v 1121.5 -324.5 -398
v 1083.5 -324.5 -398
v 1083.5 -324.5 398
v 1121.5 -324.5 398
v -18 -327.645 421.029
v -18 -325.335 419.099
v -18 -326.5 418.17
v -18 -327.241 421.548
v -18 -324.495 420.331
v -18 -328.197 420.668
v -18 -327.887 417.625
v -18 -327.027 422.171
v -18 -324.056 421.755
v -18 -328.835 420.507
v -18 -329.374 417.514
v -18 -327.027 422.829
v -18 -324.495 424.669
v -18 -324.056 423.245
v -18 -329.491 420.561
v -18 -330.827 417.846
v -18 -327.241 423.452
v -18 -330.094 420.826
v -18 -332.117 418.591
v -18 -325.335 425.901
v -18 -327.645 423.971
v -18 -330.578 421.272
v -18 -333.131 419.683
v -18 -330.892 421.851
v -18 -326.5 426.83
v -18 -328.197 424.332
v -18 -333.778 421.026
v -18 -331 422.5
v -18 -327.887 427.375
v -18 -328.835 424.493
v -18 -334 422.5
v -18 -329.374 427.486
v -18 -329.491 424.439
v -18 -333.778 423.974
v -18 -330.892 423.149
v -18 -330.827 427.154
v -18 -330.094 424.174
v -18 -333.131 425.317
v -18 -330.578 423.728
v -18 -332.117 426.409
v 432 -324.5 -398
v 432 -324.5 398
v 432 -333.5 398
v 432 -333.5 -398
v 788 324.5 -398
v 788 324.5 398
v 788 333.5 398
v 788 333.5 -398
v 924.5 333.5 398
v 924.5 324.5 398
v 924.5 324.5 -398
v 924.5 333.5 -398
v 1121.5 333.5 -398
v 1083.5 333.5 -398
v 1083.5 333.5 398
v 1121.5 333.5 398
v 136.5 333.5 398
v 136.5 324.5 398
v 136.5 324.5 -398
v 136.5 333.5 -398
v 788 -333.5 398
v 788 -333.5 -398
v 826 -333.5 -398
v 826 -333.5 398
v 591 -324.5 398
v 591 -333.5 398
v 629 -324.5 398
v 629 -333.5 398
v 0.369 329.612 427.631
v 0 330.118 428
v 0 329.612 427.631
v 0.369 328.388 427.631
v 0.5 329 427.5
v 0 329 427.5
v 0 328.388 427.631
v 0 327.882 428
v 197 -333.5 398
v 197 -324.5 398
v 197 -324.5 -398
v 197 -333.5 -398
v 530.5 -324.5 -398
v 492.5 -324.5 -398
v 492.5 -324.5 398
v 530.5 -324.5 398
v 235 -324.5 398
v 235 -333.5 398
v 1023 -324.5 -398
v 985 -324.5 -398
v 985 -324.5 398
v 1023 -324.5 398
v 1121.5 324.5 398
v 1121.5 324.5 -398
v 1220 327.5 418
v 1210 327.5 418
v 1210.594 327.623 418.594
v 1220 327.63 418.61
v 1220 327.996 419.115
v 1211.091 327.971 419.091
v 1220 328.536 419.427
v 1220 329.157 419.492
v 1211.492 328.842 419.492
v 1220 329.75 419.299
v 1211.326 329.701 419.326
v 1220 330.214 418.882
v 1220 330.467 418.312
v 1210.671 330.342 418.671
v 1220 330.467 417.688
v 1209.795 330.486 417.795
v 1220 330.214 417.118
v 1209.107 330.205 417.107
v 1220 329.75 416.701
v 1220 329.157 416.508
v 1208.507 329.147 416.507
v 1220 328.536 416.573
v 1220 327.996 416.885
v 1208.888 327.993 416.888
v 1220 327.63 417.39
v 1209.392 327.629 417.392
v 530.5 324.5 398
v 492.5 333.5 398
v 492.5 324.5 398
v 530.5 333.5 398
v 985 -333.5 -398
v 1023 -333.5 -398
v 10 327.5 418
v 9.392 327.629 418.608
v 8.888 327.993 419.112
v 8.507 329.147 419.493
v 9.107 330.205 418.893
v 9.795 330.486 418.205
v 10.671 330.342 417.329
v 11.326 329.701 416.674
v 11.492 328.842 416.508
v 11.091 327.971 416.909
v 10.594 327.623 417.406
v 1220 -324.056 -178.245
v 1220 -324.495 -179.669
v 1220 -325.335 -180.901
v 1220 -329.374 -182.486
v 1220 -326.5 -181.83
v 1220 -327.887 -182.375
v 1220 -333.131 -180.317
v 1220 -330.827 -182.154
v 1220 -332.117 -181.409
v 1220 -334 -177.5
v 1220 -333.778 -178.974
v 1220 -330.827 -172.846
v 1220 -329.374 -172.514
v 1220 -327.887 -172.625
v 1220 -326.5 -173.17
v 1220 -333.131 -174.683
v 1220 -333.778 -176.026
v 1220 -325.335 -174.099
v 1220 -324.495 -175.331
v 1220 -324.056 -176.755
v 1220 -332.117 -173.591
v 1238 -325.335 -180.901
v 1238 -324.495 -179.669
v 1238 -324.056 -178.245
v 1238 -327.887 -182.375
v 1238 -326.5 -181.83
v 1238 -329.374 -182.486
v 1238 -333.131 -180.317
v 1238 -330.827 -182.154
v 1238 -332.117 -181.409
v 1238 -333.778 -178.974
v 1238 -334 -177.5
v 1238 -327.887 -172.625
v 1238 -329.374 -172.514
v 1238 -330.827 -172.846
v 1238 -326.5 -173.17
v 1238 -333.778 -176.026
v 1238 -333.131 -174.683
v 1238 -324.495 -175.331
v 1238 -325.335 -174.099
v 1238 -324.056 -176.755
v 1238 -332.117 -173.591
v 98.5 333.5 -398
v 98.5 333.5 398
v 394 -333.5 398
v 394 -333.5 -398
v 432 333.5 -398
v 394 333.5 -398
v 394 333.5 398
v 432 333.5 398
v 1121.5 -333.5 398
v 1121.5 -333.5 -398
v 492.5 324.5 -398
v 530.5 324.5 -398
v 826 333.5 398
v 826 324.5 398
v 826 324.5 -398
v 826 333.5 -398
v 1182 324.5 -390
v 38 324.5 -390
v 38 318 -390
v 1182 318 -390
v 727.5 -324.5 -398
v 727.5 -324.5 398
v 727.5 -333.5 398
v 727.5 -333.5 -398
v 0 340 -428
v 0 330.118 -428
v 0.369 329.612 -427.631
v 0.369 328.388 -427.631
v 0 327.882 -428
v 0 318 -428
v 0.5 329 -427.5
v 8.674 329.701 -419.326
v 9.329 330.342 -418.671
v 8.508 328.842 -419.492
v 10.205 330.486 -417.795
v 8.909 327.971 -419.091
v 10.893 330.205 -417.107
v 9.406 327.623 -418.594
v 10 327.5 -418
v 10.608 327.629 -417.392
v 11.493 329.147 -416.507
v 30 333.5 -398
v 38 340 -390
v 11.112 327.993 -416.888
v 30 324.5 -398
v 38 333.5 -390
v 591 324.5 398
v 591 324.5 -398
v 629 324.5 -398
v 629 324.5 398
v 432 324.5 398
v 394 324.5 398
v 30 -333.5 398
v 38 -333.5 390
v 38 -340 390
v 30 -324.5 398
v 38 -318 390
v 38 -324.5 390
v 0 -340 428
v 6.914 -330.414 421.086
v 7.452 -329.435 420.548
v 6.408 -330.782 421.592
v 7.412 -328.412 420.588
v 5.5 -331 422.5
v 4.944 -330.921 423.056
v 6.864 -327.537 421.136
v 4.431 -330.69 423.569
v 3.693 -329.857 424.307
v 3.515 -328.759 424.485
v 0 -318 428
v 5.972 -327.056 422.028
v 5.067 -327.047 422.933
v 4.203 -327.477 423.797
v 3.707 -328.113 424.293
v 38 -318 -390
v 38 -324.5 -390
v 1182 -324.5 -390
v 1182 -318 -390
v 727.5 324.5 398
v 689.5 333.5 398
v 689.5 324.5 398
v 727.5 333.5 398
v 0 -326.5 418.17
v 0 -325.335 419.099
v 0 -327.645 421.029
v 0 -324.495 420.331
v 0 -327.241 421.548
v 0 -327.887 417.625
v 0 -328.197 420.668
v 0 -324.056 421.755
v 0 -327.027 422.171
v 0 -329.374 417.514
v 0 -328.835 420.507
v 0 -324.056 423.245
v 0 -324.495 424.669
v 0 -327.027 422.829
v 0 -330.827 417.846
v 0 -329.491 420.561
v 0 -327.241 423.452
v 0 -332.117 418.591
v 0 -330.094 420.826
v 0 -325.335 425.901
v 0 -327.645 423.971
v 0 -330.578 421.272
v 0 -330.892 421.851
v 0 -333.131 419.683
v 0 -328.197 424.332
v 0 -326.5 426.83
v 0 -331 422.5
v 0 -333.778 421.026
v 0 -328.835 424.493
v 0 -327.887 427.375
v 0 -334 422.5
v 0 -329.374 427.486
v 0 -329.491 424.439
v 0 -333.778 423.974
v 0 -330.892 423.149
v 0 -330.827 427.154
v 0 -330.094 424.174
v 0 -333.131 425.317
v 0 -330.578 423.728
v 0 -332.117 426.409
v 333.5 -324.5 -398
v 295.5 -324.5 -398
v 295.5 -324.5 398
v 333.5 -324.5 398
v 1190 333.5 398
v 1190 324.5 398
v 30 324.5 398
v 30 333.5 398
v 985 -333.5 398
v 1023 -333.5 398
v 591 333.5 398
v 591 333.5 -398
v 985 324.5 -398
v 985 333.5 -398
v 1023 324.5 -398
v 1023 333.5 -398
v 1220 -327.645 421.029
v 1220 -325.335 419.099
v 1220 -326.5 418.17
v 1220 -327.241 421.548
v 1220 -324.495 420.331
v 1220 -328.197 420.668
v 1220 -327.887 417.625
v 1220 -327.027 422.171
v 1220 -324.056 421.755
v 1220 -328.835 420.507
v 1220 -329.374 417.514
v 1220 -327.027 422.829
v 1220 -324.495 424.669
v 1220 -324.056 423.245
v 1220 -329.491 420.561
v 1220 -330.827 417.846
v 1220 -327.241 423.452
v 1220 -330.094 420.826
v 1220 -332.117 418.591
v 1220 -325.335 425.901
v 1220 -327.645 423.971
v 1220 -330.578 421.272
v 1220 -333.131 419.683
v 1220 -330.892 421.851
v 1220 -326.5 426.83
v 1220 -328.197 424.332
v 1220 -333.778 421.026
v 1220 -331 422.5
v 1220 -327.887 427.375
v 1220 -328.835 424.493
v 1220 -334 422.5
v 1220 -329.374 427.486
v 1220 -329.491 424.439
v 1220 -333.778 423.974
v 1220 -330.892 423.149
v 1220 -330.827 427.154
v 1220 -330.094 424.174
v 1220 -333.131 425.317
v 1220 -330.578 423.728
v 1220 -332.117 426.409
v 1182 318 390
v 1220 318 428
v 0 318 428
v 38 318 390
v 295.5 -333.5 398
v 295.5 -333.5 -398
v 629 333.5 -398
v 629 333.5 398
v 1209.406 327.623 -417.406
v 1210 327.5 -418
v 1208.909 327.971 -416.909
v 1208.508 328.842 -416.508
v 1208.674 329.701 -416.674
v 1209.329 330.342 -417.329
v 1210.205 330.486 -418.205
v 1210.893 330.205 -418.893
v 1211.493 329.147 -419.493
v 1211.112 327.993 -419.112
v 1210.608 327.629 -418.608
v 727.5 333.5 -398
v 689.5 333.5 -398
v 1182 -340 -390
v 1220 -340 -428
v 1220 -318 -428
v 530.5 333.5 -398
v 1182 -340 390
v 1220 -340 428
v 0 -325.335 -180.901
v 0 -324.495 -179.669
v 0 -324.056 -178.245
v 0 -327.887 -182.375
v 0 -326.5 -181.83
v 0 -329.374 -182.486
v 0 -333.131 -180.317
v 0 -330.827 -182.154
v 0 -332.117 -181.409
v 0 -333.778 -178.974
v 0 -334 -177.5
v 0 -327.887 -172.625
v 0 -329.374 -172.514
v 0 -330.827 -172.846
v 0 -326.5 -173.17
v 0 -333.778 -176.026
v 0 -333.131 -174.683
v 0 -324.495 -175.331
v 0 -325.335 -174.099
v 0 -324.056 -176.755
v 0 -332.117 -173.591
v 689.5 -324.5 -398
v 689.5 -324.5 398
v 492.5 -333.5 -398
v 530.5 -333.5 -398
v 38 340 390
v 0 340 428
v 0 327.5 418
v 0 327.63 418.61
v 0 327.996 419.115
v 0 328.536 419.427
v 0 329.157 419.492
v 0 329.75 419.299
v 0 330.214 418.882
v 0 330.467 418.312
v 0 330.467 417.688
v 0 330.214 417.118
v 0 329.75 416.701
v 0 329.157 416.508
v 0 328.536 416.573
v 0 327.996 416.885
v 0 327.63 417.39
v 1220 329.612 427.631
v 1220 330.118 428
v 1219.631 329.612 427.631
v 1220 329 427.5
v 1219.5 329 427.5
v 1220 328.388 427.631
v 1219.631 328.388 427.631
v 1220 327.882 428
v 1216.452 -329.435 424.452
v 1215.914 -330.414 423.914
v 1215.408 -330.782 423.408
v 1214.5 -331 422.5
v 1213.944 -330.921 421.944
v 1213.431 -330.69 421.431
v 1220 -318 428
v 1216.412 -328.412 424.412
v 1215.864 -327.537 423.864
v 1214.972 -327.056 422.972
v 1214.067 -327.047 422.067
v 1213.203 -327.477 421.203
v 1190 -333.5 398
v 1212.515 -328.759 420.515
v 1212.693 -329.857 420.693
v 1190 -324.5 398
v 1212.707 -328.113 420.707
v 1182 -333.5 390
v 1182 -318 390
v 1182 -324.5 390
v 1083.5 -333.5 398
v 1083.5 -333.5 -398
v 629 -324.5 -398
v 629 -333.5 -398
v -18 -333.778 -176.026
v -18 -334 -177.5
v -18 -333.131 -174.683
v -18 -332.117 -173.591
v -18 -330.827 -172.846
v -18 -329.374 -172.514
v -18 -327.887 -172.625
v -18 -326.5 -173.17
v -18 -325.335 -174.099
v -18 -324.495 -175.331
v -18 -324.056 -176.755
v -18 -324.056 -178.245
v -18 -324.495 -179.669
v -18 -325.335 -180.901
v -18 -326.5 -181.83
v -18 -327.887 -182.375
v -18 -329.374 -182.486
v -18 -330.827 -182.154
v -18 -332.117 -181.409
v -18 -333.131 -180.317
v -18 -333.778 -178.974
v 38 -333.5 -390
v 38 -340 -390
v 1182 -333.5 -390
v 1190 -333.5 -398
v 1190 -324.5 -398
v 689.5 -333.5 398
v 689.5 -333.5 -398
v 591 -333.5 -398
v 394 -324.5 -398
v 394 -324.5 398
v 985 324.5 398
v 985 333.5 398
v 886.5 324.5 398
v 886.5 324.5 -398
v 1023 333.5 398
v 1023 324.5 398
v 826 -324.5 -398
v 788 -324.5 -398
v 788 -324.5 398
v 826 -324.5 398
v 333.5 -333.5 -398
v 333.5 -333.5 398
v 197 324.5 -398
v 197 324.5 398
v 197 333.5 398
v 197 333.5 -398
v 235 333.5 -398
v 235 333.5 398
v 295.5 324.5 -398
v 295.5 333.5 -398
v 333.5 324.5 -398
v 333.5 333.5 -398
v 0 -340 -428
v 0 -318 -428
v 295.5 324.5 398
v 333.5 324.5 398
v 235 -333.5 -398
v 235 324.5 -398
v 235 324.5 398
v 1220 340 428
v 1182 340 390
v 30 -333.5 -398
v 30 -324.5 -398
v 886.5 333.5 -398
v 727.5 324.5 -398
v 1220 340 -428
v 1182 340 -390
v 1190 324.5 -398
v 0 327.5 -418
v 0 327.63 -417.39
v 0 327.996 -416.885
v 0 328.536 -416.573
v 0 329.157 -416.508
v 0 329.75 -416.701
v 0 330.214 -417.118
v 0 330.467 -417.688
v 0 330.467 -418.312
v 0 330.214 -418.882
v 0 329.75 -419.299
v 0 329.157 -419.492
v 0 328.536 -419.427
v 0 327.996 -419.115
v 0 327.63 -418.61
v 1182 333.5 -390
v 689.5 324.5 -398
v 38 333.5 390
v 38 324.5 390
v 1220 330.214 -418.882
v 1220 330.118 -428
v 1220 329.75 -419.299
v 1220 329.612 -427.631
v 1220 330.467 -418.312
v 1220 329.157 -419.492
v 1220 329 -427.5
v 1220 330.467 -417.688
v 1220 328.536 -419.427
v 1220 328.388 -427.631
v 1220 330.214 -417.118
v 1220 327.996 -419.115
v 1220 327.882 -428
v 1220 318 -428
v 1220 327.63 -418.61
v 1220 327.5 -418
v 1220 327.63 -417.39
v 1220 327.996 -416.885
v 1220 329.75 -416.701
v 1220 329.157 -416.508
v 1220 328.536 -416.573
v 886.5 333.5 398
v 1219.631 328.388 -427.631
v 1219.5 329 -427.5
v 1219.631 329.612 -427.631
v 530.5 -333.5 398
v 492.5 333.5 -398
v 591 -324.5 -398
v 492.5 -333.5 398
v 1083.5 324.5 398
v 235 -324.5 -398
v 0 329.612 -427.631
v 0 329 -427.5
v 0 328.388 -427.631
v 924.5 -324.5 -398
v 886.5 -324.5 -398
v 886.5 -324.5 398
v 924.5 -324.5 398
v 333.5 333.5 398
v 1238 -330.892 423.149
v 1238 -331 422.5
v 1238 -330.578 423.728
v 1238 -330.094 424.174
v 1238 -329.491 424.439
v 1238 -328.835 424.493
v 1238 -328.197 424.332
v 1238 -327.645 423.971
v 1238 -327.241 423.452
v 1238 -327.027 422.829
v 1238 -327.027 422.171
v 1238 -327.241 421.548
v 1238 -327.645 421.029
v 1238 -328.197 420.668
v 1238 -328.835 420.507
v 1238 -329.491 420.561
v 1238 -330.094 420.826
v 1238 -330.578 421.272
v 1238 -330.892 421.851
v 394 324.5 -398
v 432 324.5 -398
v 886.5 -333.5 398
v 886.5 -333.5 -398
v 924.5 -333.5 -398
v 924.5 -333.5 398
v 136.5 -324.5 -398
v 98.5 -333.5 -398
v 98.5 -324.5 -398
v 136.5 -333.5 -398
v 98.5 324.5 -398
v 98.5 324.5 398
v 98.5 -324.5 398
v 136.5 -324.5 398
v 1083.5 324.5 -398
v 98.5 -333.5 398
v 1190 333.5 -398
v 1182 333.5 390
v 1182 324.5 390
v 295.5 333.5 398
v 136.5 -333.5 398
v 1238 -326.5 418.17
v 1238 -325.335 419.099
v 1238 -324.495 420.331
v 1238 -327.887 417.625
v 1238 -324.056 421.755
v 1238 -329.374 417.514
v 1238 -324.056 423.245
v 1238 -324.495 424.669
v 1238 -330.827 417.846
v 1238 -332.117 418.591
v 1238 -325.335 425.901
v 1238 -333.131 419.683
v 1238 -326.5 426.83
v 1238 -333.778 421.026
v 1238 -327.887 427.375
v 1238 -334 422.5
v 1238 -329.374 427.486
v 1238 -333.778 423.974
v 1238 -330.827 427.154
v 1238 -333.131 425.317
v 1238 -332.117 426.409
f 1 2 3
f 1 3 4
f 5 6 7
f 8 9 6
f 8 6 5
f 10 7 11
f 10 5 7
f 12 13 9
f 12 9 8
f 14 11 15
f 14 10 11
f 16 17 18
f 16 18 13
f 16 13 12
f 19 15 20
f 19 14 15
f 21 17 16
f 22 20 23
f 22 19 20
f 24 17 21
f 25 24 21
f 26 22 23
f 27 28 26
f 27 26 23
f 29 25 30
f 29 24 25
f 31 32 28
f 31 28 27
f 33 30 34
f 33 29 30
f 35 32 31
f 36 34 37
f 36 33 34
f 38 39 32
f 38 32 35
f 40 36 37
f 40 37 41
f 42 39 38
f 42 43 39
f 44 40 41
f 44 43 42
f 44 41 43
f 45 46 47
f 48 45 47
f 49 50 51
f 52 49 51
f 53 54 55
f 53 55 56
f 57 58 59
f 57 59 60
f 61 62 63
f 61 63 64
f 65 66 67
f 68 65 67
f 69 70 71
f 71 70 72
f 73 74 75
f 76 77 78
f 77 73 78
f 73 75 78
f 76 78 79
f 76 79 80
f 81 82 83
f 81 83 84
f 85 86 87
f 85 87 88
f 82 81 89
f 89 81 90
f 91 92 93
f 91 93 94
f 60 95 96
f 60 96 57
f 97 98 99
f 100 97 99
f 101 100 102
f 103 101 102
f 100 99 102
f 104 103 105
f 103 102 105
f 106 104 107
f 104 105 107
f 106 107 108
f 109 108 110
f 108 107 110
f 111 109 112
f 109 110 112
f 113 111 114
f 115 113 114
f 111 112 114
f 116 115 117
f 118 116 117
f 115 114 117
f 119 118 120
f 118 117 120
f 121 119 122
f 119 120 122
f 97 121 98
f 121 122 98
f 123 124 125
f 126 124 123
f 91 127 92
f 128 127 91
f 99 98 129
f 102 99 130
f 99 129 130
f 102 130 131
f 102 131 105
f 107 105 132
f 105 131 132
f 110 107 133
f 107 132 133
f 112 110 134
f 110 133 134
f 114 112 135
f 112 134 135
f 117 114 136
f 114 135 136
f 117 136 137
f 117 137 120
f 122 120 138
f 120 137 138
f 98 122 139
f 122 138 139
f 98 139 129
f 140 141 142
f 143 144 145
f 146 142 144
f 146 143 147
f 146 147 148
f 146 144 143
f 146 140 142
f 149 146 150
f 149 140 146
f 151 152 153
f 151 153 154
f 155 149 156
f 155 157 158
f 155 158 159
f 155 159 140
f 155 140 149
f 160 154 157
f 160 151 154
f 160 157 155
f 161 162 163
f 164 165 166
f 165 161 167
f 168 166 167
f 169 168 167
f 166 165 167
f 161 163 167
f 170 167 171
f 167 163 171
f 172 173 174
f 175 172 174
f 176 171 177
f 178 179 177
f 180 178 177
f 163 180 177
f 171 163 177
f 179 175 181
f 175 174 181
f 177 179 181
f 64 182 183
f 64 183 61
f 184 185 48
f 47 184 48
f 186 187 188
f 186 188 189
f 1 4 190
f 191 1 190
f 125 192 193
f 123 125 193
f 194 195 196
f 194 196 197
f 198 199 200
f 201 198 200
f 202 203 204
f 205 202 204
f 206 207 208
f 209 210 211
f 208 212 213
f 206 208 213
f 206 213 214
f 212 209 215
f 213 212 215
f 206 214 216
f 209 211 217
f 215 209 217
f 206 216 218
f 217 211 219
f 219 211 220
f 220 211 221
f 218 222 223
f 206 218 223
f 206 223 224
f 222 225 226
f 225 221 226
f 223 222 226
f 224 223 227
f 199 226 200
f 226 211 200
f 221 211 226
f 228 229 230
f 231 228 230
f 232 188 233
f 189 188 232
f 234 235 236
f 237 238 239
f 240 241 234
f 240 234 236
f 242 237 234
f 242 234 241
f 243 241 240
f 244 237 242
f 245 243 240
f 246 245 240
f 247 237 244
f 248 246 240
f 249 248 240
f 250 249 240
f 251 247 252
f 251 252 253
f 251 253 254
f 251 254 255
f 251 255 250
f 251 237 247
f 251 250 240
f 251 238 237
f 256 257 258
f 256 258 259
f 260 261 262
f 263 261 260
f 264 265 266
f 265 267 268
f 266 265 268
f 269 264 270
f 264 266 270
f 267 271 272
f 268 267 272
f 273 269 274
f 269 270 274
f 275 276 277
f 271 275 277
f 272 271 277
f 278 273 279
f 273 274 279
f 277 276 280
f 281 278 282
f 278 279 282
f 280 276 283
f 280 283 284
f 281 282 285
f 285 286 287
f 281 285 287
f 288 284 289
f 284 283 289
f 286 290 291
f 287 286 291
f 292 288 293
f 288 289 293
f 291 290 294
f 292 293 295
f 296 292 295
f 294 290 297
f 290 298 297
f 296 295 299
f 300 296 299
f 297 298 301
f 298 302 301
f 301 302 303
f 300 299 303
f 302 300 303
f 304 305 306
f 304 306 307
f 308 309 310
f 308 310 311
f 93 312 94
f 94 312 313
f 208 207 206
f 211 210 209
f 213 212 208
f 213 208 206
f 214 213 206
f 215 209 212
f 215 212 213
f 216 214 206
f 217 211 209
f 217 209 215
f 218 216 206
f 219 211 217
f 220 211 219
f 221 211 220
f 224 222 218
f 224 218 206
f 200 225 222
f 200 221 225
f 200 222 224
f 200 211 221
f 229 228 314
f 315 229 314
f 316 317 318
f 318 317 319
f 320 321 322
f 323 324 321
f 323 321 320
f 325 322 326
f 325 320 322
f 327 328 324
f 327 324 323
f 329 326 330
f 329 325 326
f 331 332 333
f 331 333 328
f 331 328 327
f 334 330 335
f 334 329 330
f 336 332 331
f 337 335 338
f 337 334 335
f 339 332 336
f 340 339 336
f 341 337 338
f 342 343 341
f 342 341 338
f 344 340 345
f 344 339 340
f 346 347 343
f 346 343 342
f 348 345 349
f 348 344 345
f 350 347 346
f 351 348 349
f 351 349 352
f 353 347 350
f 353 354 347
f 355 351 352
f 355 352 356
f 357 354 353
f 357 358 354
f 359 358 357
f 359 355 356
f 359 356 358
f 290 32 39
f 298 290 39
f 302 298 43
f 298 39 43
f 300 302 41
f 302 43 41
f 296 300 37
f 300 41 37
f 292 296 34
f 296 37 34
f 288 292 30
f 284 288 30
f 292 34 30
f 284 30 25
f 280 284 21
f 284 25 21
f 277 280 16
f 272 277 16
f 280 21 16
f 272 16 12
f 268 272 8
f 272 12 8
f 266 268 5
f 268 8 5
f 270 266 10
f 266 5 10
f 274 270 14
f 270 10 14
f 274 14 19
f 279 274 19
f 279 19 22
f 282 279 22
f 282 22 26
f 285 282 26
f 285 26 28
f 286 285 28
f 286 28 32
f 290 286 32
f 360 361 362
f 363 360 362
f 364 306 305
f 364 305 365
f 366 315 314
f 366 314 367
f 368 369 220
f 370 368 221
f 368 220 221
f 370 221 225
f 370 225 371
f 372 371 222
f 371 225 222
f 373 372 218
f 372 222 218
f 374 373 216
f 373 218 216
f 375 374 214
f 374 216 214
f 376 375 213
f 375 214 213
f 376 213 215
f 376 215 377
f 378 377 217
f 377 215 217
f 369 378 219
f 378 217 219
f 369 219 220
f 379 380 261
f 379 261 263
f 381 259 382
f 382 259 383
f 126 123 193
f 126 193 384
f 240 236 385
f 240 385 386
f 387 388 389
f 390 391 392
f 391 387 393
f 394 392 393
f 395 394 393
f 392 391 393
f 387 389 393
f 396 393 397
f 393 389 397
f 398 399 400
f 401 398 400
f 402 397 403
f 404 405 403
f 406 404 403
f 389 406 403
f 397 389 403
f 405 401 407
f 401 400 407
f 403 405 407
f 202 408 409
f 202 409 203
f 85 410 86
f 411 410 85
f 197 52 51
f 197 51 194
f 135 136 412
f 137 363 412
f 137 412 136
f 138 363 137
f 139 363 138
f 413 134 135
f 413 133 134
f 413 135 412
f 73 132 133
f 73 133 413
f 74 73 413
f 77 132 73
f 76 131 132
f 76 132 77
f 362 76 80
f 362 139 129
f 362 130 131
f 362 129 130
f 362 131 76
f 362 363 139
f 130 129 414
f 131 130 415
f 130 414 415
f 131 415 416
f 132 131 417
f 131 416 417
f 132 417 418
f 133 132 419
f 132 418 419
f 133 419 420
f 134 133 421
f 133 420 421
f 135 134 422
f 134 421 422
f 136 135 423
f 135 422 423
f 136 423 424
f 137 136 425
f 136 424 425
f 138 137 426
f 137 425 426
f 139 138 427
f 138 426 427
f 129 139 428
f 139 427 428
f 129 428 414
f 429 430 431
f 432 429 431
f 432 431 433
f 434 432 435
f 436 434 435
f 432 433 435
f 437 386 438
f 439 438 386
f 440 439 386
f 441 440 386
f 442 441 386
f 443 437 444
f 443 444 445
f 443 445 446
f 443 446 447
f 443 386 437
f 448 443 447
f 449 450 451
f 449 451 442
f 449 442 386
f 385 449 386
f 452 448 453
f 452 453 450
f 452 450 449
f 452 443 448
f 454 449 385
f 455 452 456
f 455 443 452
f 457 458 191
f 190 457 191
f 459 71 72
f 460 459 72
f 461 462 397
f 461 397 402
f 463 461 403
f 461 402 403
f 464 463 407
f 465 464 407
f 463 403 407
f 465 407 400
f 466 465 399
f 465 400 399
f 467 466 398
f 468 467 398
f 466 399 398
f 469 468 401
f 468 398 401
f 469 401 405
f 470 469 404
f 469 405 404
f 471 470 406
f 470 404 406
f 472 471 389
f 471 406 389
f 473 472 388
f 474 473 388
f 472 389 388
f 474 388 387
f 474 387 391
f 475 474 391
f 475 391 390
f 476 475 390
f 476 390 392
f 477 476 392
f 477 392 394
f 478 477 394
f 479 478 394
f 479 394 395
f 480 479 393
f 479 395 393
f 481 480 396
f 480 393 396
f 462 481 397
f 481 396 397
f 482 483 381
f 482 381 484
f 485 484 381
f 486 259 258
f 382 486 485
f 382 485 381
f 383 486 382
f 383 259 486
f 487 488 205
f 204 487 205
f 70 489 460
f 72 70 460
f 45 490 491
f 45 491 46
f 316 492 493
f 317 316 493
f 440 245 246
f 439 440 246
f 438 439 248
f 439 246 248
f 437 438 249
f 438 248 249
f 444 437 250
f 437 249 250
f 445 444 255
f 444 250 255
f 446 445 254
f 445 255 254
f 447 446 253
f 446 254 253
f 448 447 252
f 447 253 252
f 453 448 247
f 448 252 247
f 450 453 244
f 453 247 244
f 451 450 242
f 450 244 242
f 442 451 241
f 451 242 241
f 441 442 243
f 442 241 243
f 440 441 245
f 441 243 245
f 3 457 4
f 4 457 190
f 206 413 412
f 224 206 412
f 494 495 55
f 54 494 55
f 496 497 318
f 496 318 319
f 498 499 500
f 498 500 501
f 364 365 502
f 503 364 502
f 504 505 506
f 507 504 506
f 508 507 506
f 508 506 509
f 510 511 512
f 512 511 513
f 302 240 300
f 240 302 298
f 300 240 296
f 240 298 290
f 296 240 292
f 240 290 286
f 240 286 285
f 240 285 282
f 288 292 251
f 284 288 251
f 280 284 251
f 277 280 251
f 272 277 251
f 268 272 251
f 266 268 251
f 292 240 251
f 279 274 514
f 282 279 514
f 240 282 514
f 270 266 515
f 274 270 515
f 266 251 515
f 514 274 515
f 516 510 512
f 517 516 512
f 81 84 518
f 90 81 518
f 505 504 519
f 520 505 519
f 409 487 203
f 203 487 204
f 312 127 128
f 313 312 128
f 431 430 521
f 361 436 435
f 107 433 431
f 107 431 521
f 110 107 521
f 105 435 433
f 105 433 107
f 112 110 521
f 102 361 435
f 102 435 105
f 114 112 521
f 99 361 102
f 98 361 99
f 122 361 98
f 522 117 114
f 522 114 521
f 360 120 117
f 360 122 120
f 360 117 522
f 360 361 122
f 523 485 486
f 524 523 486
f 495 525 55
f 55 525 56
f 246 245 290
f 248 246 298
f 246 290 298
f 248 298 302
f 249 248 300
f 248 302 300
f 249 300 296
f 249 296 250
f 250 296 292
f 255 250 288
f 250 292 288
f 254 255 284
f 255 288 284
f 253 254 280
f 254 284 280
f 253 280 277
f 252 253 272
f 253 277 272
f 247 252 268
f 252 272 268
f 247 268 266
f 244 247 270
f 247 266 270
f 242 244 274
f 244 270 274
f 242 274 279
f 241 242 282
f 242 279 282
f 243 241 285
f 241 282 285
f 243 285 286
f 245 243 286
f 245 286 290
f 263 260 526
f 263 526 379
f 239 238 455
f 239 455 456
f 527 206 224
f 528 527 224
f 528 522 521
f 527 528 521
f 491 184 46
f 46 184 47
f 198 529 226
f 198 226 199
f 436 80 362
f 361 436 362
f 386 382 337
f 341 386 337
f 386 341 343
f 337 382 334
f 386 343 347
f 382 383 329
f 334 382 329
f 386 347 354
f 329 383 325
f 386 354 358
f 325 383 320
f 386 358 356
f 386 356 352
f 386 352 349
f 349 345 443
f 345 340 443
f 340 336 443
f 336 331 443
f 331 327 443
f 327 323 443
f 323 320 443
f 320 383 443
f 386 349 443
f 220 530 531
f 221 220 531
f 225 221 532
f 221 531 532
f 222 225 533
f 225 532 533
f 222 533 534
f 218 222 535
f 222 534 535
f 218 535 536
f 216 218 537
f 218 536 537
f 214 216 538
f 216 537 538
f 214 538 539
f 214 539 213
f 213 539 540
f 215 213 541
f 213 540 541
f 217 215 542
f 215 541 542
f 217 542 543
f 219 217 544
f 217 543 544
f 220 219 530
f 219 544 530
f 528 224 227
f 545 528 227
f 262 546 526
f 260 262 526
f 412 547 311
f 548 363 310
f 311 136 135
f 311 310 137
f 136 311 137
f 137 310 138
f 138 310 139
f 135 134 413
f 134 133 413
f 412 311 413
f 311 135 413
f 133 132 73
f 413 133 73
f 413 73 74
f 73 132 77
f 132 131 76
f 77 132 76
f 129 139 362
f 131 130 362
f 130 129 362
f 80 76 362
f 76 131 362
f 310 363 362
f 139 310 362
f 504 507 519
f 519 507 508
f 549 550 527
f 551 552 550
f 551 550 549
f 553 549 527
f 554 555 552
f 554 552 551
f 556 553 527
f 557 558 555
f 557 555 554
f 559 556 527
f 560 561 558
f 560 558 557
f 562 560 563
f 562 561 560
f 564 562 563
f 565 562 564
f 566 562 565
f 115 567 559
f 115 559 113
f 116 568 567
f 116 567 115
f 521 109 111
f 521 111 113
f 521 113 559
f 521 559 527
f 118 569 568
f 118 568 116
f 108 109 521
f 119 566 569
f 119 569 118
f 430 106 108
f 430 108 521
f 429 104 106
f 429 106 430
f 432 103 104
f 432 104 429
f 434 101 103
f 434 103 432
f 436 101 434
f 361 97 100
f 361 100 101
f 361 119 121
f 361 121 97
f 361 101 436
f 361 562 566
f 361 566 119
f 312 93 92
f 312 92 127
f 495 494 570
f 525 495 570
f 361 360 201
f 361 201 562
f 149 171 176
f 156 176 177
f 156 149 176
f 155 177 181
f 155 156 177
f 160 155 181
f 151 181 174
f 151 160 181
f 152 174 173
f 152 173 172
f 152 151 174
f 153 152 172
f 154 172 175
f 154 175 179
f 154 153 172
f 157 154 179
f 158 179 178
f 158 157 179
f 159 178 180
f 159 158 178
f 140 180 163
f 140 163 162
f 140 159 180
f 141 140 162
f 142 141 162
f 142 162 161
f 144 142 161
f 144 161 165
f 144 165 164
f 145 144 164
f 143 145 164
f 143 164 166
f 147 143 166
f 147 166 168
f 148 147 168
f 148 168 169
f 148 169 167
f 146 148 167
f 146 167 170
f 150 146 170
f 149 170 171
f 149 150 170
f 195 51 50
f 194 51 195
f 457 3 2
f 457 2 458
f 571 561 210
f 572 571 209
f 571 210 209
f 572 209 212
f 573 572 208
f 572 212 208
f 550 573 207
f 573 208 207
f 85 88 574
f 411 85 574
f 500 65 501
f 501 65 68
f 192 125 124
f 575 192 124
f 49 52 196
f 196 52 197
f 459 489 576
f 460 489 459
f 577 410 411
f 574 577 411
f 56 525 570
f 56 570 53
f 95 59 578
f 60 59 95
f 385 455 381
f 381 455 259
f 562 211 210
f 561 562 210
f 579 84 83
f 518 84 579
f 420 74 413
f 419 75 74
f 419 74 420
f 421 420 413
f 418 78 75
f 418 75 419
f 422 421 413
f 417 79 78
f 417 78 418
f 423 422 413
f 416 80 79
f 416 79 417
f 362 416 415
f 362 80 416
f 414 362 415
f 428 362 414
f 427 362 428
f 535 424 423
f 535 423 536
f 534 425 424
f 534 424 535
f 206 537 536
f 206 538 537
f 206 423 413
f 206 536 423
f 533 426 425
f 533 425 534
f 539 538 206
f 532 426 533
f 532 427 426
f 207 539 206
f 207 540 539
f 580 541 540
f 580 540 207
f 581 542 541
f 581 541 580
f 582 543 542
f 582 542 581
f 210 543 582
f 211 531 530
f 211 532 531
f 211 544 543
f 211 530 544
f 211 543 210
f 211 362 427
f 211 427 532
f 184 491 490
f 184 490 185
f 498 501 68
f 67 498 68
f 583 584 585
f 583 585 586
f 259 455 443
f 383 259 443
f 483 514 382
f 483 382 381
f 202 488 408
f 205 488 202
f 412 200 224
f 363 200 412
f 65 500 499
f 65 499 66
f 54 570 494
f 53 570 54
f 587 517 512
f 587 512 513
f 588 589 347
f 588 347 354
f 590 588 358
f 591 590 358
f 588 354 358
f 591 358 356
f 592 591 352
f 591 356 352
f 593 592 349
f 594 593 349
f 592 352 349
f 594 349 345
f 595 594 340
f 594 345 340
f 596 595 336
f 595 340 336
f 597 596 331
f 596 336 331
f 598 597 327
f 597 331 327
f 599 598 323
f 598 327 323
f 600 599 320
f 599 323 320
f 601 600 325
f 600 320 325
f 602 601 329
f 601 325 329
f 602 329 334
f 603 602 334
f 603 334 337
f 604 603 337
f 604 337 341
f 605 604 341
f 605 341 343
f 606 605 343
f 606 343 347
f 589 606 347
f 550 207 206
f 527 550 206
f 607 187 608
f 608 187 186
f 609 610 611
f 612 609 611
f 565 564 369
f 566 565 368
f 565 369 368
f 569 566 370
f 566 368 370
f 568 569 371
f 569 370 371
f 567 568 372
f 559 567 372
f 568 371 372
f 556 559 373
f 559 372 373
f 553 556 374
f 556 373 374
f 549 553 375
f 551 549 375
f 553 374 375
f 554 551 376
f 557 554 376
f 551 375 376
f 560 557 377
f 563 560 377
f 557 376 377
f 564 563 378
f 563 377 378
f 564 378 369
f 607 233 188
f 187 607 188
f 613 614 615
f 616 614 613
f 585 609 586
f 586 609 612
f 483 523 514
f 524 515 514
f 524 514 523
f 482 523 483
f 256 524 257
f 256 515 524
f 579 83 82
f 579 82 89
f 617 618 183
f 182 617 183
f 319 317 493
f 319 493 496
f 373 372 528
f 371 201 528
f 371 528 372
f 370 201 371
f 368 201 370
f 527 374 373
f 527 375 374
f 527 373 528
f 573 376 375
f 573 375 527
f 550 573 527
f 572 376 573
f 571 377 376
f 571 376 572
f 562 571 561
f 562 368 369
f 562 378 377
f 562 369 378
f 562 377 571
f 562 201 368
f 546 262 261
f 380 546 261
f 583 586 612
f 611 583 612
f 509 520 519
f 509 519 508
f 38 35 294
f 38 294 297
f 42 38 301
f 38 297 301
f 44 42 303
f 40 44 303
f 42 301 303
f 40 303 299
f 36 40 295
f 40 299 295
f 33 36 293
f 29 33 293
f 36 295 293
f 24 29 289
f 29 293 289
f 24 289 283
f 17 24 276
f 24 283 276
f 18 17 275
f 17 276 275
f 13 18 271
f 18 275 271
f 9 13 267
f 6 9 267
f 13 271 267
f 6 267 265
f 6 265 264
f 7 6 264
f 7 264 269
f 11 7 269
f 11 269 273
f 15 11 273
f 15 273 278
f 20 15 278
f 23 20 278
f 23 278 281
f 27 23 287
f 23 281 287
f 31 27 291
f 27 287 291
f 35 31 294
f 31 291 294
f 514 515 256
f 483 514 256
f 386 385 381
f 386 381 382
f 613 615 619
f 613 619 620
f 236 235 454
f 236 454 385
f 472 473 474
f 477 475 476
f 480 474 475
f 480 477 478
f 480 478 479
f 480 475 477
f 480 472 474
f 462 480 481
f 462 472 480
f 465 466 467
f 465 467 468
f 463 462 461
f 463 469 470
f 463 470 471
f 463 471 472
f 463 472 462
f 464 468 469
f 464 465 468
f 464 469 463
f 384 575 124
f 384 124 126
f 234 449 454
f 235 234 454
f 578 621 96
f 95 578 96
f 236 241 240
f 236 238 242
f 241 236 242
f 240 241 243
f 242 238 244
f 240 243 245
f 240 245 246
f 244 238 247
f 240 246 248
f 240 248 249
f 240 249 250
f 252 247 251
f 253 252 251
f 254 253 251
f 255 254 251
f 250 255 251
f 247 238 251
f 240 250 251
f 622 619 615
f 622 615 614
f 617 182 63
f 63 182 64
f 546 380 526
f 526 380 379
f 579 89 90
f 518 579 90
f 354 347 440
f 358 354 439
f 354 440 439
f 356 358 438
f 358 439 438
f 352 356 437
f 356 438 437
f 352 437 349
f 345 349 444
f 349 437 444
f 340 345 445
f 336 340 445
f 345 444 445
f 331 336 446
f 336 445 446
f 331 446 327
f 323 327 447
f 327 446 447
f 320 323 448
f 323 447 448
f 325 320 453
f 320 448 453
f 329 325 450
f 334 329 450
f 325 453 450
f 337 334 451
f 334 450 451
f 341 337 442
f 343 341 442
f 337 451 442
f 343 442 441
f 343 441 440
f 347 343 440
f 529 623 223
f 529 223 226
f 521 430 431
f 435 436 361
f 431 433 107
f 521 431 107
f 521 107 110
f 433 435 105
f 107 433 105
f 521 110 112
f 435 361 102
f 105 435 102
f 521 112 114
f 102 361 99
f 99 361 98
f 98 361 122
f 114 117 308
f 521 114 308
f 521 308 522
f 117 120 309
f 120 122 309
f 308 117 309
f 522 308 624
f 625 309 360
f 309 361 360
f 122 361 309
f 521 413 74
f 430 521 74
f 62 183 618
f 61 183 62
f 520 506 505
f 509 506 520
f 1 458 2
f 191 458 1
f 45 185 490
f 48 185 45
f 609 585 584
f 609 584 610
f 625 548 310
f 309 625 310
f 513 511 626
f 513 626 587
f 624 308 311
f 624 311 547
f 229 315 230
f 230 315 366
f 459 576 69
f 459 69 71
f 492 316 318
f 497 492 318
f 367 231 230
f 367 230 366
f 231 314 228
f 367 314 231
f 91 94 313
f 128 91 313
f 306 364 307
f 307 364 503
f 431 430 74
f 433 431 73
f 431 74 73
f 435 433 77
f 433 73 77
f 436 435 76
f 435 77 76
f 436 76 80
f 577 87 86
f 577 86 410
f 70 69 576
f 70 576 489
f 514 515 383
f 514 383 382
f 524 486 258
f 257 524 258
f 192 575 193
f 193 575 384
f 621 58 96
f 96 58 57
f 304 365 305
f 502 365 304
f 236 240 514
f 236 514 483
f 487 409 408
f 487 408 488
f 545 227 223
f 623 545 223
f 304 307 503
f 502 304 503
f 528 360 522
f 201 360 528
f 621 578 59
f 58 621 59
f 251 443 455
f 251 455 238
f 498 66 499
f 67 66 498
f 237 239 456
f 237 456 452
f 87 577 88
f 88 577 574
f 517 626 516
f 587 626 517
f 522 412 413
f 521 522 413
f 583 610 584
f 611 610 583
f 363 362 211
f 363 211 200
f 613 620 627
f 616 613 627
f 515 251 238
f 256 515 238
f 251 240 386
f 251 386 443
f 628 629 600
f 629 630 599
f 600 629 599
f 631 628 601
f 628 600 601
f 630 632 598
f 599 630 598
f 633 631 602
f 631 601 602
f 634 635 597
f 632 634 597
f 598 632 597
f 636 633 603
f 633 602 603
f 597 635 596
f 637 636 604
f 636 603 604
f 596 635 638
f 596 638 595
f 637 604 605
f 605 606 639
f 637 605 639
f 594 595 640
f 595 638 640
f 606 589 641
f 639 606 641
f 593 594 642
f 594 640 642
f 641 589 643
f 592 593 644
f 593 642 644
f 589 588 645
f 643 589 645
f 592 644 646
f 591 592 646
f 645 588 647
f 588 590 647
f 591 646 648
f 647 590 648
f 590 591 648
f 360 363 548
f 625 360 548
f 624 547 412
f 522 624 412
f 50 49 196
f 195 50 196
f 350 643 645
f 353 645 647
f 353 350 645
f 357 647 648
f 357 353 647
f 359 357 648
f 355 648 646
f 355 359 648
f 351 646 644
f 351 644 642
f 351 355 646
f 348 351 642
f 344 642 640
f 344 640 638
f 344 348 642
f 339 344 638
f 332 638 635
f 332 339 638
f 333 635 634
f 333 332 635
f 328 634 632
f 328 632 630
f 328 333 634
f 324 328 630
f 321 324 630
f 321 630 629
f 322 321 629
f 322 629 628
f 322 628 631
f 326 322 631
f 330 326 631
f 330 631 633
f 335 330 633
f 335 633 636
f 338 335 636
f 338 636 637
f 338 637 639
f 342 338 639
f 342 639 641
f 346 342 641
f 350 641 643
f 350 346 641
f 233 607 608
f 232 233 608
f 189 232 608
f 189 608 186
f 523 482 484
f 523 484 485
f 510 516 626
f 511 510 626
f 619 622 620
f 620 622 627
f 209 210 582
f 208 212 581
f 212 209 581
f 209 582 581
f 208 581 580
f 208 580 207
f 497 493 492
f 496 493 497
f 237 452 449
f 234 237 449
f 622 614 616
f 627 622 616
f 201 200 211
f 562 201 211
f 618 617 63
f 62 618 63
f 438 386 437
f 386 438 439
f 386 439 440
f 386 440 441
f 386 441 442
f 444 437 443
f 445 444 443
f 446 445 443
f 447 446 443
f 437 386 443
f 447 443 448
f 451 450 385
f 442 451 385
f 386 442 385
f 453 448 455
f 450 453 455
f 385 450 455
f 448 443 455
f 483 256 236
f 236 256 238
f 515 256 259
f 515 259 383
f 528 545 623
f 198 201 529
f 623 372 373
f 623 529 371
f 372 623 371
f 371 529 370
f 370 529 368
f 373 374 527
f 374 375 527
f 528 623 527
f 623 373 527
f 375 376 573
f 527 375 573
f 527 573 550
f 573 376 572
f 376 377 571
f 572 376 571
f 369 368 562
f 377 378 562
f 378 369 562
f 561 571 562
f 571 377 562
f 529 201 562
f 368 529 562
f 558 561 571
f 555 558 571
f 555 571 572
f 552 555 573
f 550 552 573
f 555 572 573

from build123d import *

# Parameters (mm, degrees)
F1_DEPTH  = 1220
F3_DEPTH  = 350
F4_DEPTH  = 22
F5_W      = 38
F5_H      = 9
F6_DEPTH  = 796
F9_R      = 1.5
F10_DEPTH = 1220.001
F11_R     = 5
F12_DEPTH = 18
F16_R     = 2
F17_DEPTH = 1256


with BuildPart() as f1:
    # F0 (on Right) → F1 (new body)
    with BuildSketch(Plane.YZ):
        Polygon((340, 428), (318, 428), (318, 390), (324.5, 390), (324.5, 398), (333.5, 398), (333.5, 390), (340, 390), align=None)
    extrude(amount=F1_DEPTH)


with BuildPart() as f1b:
    # F0 (on Right) → F1, piece 2 (new body)
    with BuildSketch(Plane.YZ):
        Polygon((324.5, -390), (318, -390), (318, -428), (340, -428), (340, -390), (333.5, -390), (333.5, -398), (324.5, -398), align=None)
    extrude(amount=F1_DEPTH)


with BuildPart() as f3_tool:
    # F2 (on face) → F3 (new body)
    with BuildSketch(Plane.XZ.offset(-318)):
        Polygon((0, 428), (0, -428), (38, -390), (38, 390), align=None)
        Polygon((1220, 428), (1182, 390), (1182, -390), (1220, -428), align=None)
    extrude(amount=-F3_DEPTH)


with BuildPart() as f1_1:
    add(f1.part)

    # F3: cut by f3_tool
    add(f3_tool.part, mode=Mode.SUBTRACT)


with BuildPart() as f1b_1:
    add(f1b.part)

    # F3: cut by f3_tool
    add(f3_tool.part, mode=Mode.SUBTRACT)


with BuildPart() as f4:
    # F2 (on face) → F4 (new body)
    with BuildSketch(Plane.XZ.offset(-318)):
        Polygon((0, 428), (0, -428), (38, -390), (38, 390), align=None)
    extrude(amount=-F4_DEPTH)


with BuildPart() as f4b:
    # F2 (on face) → F4, piece 2 (new body)
    with BuildSketch(Plane.XZ.offset(-318)):
        Polygon((1220, 428), (1182, 390), (1182, -390), (1220, -428), align=None)
    extrude(amount=-F4_DEPTH)


with BuildPart() as f6:
    # F5 (on face) → F6 (new body, through all)
    with BuildSketch(Plane.XY.offset(-398)):
        with Locations((117.5, 329)):
            Rectangle(F5_W, F5_H)
    extrude(amount=F6_DEPTH)


with BuildPart() as f6b:
    # F5 (on face) → F6, piece 2 (new body, through all)
    with BuildSketch(Plane.XY.offset(-398)):
        with Locations((216, 329)):
            Rectangle(F5_W, F5_H)
    extrude(amount=F6_DEPTH)


with BuildPart() as f6c:
    # F5 (on face) → F6, piece 3 (new body, through all)
    with BuildSketch(Plane.XY.offset(-398)):
        with Locations((314.5, 329)):
            Rectangle(F5_W, F5_H)
    extrude(amount=F6_DEPTH)


with BuildPart() as f6d:
    # F5 (on face) → F6, piece 4 (new body, through all)
    with BuildSketch(Plane.XY.offset(-398)):
        with Locations((413, 329)):
            Rectangle(F5_W, F5_H)
    extrude(amount=F6_DEPTH)


with BuildPart() as f6e:
    # F5 (on face) → F6, piece 5 (new body, through all)
    with BuildSketch(Plane.XY.offset(-398)):
        with Locations((511.5, 329)):
            Rectangle(F5_W, F5_H)
    extrude(amount=F6_DEPTH)


with BuildPart() as f6f:
    # F5 (on face) → F6, piece 6 (new body, through all)
    with BuildSketch(Plane.XY.offset(-398)):
        with Locations((610, 329)):
            Rectangle(F5_W, F5_H)
    extrude(amount=F6_DEPTH)


with BuildPart() as f6g:
    # F5 (on face) → F6, piece 7 (new body, through all)
    with BuildSketch(Plane.XY.offset(-398)):
        with Locations((708.5, 329)):
            Rectangle(F5_W, F5_H)
    extrude(amount=F6_DEPTH)


with BuildPart() as f6h:
    # F5 (on face) → F6, piece 8 (new body, through all)
    with BuildSketch(Plane.XY.offset(-398)):
        with Locations((807, 329)):
            Rectangle(F5_W, F5_H)
    extrude(amount=F6_DEPTH)


with BuildPart() as f6i:
    # F5 (on face) → F6, piece 9 (new body, through all)
    with BuildSketch(Plane.XY.offset(-398)):
        with Locations((905.5, 329)):
            Rectangle(F5_W, F5_H)
    extrude(amount=F6_DEPTH)


with BuildPart() as f6j:
    # F5 (on face) → F6, piece 10 (new body, through all)
    with BuildSketch(Plane.XY.offset(-398)):
        with Locations((1004, 329)):
            Rectangle(F5_W, F5_H)
    extrude(amount=F6_DEPTH)


with BuildPart() as f6k:
    # F5 (on face) → F6, piece 11 (new body, through all)
    with BuildSketch(Plane.XY.offset(-398)):
        with Locations((1102.5, 329)):
            Rectangle(F5_W, F5_H)
    extrude(amount=F6_DEPTH)


with BuildPart() as f8_1:
    # F8: instance of F4
    add(f4.part.mirror(Plane.XZ))


with BuildPart() as f8_2:
    # F8: instance of F4b
    add(f4b.part.mirror(Plane.XZ))


with BuildPart() as f8_3:
    # F8: instance of F6g
    add(f6g.part.mirror(Plane.XZ))


with BuildPart() as f8_4:
    # F8: instance of F6
    add(f6.part.mirror(Plane.XZ))


with BuildPart() as f8_5:
    # F8: instance of F6b
    add(f6b.part.mirror(Plane.XZ))


with BuildPart() as f8_6:
    # F8: instance of F6c
    add(f6c.part.mirror(Plane.XZ))


with BuildPart() as f8_7:
    # F8: instance of F6d
    add(f6d.part.mirror(Plane.XZ))


with BuildPart() as f8_8:
    # F8: instance of F6e
    add(f6e.part.mirror(Plane.XZ))


with BuildPart() as f8_9:
    # F8: instance of F6f
    add(f6f.part.mirror(Plane.XZ))


with BuildPart() as f8_10:
    # F8: instance of F6h
    add(f6h.part.mirror(Plane.XZ))


with BuildPart() as f8_11:
    # F8: instance of F6i
    add(f6i.part.mirror(Plane.XZ))


with BuildPart() as f8_12:
    # F8: instance of F6j
    add(f6j.part.mirror(Plane.XZ))


with BuildPart() as f8_13:
    # F8: instance of F6k
    add(f6k.part.mirror(Plane.XZ))


with BuildPart() as f8_14:
    # F8: instance of F1
    add(f1_1.part.mirror(Plane.XZ))


with BuildPart() as f8_15:
    # F8: instance of F1b
    add(f1b_1.part.mirror(Plane.XZ))


with BuildPart() as f10_tool:
    # F9 (on face) → F10 (new body, through all)
    with BuildSketch(Plane(origin=(0, 0, 0), x_dir=(0, -1, 0), z_dir=(-1, 0, 0))):
        with Locations((-329, 429)):
            Circle(F9_R)
        with Locations((-329, 418)):
            Circle(F9_R)
        with Locations((-329, -418)):
            Circle(F9_R)
        with Locations((-329, -429)):
            Circle(F9_R)
    extrude(amount=-F10_DEPTH)


with BuildPart() as f1_2:
    add(f1_1.part)

    # F10: cut by f10_tool
    add(f10_tool.part, mode=Mode.SUBTRACT)


with BuildPart() as f1b_2:
    add(f1b_1.part)

    # F10: cut by f10_tool
    add(f10_tool.part, mode=Mode.SUBTRACT)


with BuildPart() as f4_1:
    add(f4.part)

    # F10: cut by f10_tool
    add(f10_tool.part, mode=Mode.SUBTRACT)


with BuildPart() as f4b_1:
    add(f4b.part)

    # F10: cut by f10_tool
    add(f10_tool.part, mode=Mode.SUBTRACT)


with BuildPart() as f12:
    # F11 (on face) → F12 (new body)
    with BuildSketch(Plane(origin=(0, 0, 0), x_dir=(0, -1, 0), z_dir=(-1, 0, 0))):
        with Locations((329, 422.5)):
            Circle(F11_R)
    extrude(amount=F12_DEPTH)


with BuildPart() as f12b:
    # F11 (on face) → F12, piece 2 (new body)
    with BuildSketch(Plane(origin=(0, 0, 0), x_dir=(0, -1, 0), z_dir=(-1, 0, 0))):
        with Locations((329, -177.5)):
            Circle(F11_R)
    extrude(amount=F12_DEPTH)


with BuildPart() as f15_1:
    # F15: instance of F12
    add(f12.part.mirror(Plane(origin=(610, -329, 0), x_dir=(0, -1, 0), z_dir=(-1, 0, 0))))


with BuildPart() as f15_2:
    # F15: instance of F12b
    add(f12b.part.mirror(Plane(origin=(610, -329, 0), x_dir=(0, -1, 0), z_dir=(-1, 0, 0))))


with BuildPart() as f17_tool:
    # F16 (on face) → F17 (new body, through all)
    with BuildSketch(Plane(origin=(-18, 0, 0), x_dir=(0, -1, 0), z_dir=(-1, 0, 0))):
        with Locations((329, 422.5)):
            Circle(F16_R)
    extrude(amount=-F17_DEPTH)


with BuildPart() as f8_1_1:
    add(f8_1.part)

    # F17: cut by f17_tool
    add(f17_tool.part, mode=Mode.SUBTRACT)


with BuildPart() as f8_2_1:
    add(f8_2.part)

    # F17: cut by f17_tool
    add(f17_tool.part, mode=Mode.SUBTRACT)


with BuildPart() as f8_14_1:
    add(f8_14.part)

    # F17: cut by f17_tool
    add(f17_tool.part, mode=Mode.SUBTRACT)


with BuildPart() as f12_1:
    add(f12.part)

    # F17: cut by f17_tool
    add(f17_tool.part, mode=Mode.SUBTRACT)


with BuildPart() as f15_1_1:
    add(f15_1.part)

    # F17: cut by f17_tool
    add(f17_tool.part, mode=Mode.SUBTRACT)


solid = Compound([f6.part, f6b.part, f6c.part, f6d.part, f6e.part, f6f.part, f6g.part, f6h.part, f6i.part, f6j.part, f6k.part, f8_3.part, f8_4.part, f8_5.part, f8_6.part, f8_7.part, f8_8.part, f8_9.part, f8_10.part, f8_11.part, f8_12.part, f8_13.part, f8_15.part, f1_2.part, f1b_2.part, f4_1.part, f4b_1.part, f12b.part, f15_2.part, f8_1_1.part, f8_2_1.part, f8_14_1.part, f12_1.part, f15_1_1.part])
